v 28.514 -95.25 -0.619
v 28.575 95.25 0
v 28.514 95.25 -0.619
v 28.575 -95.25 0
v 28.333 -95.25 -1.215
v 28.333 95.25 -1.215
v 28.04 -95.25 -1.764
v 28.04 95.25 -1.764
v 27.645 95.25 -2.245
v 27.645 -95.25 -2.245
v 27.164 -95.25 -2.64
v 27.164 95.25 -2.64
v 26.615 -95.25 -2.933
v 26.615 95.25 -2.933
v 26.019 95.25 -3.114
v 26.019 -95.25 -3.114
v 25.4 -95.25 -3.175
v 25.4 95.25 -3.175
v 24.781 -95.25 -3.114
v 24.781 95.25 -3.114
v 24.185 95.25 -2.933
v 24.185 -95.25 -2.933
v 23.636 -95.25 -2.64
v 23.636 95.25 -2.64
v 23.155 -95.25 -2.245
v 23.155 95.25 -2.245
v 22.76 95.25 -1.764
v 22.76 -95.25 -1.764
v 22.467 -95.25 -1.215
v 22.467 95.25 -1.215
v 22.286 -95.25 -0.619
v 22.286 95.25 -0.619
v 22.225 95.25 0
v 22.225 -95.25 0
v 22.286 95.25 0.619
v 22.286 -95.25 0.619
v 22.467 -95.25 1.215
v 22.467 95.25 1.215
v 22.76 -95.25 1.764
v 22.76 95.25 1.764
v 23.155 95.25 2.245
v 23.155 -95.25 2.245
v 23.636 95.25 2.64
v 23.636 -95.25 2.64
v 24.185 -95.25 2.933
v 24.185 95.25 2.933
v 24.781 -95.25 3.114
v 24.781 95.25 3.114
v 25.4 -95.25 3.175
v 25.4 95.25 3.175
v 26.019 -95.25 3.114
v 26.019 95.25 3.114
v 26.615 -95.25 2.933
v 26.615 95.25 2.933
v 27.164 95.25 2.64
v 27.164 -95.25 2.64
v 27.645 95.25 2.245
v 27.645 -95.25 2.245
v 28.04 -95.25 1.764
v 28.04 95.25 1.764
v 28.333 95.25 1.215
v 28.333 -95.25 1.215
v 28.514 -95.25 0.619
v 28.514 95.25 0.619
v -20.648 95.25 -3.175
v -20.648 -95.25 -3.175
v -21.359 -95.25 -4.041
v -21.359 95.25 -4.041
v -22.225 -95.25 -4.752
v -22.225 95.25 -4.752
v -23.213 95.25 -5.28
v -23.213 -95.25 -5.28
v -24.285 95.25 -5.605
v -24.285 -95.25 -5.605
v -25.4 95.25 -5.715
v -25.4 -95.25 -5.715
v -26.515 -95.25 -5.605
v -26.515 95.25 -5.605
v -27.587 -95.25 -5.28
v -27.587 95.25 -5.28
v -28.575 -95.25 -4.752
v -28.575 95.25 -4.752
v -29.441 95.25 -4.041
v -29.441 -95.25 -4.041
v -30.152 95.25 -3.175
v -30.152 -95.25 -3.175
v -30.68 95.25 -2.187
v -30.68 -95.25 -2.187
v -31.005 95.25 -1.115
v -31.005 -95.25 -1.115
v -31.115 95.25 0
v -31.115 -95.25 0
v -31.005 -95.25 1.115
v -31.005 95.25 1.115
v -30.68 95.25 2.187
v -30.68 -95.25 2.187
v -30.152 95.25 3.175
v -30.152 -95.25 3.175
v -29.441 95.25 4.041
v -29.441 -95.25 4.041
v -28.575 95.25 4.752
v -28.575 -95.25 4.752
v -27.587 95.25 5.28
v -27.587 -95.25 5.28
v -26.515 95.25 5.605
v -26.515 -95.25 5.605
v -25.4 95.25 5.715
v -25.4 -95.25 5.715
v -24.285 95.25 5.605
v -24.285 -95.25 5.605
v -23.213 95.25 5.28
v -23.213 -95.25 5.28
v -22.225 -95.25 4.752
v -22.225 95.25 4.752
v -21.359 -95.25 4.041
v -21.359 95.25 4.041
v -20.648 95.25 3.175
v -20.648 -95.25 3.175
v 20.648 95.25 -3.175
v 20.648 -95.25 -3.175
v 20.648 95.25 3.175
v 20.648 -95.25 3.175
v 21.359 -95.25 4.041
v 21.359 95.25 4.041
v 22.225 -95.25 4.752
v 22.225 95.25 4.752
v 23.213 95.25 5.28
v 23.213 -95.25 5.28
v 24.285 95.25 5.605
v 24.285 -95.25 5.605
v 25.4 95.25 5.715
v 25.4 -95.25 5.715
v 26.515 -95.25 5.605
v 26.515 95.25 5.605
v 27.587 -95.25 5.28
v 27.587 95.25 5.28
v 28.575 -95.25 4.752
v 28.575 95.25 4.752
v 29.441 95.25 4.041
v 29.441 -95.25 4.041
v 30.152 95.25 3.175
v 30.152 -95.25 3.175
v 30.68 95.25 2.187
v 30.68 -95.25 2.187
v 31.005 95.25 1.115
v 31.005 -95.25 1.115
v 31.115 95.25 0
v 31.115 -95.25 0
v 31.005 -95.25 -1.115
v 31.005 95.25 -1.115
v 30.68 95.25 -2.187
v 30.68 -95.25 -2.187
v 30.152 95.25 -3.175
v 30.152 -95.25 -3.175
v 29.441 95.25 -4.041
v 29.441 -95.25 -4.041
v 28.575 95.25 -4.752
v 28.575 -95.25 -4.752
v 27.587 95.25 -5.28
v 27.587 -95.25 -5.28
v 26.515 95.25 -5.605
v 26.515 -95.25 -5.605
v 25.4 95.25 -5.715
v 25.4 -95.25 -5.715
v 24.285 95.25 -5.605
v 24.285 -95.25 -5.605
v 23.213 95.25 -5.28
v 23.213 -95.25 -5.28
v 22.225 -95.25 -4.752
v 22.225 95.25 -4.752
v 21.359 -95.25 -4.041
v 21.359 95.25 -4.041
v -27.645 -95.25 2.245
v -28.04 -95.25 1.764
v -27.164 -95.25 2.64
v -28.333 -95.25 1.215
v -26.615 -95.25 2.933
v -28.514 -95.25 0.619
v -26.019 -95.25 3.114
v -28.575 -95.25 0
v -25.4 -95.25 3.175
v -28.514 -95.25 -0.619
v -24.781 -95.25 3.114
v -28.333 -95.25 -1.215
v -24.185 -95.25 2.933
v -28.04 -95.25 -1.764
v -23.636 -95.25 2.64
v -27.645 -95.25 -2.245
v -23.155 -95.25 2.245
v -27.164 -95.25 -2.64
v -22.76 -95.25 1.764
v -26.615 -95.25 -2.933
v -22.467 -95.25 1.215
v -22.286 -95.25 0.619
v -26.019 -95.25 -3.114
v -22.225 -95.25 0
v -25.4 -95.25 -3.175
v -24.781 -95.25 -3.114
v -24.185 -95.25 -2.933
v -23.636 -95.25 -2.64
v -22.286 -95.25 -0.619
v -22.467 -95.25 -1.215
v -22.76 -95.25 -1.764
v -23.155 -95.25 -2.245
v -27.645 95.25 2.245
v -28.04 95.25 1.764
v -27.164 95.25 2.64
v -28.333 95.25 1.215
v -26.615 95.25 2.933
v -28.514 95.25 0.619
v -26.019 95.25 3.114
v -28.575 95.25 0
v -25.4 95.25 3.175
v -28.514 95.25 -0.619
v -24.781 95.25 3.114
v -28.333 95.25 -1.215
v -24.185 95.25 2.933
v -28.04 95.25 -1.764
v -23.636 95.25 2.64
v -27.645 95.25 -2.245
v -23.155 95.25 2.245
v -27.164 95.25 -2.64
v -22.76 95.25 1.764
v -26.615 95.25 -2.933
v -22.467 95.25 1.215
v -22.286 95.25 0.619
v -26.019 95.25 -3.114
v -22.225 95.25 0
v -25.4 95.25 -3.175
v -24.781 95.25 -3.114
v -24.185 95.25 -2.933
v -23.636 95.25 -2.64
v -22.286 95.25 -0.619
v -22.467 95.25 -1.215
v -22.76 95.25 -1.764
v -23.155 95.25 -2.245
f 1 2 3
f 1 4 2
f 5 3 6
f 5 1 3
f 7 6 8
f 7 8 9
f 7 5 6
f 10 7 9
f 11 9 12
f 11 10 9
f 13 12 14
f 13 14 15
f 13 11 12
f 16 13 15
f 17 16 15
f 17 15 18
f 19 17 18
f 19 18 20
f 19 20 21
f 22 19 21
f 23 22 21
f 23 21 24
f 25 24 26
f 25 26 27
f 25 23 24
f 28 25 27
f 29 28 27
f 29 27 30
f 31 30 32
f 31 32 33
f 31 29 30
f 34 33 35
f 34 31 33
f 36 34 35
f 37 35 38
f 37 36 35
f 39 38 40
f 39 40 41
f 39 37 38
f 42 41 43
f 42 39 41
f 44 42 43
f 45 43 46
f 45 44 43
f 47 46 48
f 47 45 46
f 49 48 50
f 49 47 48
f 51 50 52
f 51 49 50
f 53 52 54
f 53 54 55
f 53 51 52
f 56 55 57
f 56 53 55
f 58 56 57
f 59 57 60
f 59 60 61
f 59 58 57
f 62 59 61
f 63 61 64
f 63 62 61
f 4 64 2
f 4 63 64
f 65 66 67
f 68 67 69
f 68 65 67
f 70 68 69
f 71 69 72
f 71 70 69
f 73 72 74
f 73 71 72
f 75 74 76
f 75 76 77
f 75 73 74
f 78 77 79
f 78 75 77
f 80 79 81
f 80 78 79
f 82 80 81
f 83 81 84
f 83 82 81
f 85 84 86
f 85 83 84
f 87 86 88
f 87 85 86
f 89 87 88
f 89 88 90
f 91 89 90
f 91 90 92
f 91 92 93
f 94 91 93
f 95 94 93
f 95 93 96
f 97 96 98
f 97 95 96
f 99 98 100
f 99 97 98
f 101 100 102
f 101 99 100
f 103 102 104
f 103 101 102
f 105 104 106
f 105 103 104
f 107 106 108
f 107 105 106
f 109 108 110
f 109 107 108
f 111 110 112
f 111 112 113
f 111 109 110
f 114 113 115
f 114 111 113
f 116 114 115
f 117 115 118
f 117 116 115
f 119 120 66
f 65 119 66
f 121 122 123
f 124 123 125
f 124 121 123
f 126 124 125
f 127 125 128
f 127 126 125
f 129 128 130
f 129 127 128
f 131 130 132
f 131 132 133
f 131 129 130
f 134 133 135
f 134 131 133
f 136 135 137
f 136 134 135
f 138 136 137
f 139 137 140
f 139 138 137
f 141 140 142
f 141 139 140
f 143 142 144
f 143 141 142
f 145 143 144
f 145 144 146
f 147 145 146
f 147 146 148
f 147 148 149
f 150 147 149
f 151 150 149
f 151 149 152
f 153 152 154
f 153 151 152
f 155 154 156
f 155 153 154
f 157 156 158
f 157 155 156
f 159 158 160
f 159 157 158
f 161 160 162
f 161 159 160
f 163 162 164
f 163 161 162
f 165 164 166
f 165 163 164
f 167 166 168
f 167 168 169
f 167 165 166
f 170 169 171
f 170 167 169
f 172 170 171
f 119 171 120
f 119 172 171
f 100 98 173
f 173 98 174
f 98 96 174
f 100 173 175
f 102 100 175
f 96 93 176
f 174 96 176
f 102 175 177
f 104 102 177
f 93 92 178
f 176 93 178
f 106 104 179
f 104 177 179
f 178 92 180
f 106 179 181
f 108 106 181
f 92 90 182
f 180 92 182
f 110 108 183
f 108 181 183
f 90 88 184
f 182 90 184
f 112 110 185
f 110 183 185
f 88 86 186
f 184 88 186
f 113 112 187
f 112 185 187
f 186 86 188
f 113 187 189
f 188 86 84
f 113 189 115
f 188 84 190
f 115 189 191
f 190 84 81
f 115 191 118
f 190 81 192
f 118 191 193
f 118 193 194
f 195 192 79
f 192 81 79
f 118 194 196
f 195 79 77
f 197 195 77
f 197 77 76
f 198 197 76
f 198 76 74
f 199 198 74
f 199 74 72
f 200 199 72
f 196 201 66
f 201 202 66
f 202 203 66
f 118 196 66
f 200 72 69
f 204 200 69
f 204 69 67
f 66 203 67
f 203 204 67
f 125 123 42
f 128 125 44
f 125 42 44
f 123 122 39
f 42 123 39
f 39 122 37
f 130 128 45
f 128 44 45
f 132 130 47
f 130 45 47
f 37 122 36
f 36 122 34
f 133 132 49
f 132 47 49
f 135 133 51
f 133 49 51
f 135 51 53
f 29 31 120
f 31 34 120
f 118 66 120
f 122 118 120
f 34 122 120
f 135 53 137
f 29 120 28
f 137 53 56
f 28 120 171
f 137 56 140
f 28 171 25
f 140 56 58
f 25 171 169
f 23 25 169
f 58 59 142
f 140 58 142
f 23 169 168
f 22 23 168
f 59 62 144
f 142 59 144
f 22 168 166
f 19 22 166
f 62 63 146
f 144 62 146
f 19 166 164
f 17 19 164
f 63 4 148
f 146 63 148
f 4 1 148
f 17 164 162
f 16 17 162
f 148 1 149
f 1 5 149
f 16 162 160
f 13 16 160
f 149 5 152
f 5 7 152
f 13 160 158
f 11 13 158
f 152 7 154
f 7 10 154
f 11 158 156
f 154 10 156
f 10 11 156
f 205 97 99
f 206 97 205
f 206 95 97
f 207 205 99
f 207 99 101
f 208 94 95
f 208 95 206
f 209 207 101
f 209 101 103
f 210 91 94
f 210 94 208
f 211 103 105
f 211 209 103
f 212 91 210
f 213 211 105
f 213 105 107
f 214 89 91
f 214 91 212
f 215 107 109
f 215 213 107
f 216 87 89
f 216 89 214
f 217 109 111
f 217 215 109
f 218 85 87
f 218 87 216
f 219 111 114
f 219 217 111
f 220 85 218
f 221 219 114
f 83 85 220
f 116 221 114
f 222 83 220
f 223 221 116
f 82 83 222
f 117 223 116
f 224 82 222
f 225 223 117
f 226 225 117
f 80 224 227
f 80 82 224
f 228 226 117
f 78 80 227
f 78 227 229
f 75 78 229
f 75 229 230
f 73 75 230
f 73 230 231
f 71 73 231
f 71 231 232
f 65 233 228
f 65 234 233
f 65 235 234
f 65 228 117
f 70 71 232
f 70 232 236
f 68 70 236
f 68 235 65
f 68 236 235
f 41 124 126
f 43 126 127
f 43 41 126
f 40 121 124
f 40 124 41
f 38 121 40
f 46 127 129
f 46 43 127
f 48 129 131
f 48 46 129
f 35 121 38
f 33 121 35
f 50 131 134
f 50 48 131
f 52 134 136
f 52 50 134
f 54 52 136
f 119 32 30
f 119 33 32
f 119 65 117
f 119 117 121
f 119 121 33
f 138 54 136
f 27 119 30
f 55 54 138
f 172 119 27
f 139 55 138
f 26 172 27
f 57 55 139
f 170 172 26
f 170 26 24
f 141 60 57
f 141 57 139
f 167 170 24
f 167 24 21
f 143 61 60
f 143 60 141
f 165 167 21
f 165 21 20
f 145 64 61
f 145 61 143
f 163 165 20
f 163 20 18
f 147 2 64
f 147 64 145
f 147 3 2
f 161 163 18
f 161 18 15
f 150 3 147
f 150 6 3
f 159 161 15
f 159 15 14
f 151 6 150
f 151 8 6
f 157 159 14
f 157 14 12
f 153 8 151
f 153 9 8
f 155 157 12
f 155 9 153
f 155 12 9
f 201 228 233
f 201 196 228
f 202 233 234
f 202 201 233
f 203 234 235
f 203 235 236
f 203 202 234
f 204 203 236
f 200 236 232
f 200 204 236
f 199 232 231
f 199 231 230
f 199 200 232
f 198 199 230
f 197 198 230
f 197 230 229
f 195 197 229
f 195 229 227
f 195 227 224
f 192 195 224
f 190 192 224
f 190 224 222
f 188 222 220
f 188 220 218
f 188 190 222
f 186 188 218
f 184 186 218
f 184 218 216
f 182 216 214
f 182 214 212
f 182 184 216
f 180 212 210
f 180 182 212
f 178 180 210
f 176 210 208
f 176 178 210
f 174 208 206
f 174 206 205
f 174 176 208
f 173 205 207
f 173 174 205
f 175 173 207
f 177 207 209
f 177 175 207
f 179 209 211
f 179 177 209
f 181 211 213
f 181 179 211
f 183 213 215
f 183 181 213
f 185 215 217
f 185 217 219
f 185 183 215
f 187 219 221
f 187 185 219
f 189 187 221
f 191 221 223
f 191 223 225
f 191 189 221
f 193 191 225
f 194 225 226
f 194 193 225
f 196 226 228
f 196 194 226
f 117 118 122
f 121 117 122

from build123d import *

# Parameters (mm, degrees)
SKETCH1_R           = 3.175
BOSS_EXTRUDE1_DEPTH = 95.25


with BuildPart() as part:
    # Sketch1 → Boss-Extrude1 (new body, symmetric)
    with BuildSketch(Plane(origin=(0, 0, 0), x_dir=(1, 0, 0), z_dir=(0, 1, 0))):
        with BuildLine():
            ThreePointArc((20.648095119, -3.175), (31.115, 0), (20.648095119, 3.175))
            Line((20.648095119, 3.175), (-20.648095119, 3.175))
            ThreePointArc((-20.648095119, 3.175), (-31.115, 0), (-20.648095119, -3.175))
            Line((-20.648095119, -3.175), (20.648095119, -3.175))
        make_face()
        with Locations((-25.4, 0)):
            Circle(SKETCH1_R, mode=Mode.SUBTRACT)
        with Locations((25.4, 0)):
            Circle(SKETCH1_R, mode=Mode.SUBTRACT)
    extrude(amount=BOSS_EXTRUDE1_DEPTH, both=True)


solid = part.part
